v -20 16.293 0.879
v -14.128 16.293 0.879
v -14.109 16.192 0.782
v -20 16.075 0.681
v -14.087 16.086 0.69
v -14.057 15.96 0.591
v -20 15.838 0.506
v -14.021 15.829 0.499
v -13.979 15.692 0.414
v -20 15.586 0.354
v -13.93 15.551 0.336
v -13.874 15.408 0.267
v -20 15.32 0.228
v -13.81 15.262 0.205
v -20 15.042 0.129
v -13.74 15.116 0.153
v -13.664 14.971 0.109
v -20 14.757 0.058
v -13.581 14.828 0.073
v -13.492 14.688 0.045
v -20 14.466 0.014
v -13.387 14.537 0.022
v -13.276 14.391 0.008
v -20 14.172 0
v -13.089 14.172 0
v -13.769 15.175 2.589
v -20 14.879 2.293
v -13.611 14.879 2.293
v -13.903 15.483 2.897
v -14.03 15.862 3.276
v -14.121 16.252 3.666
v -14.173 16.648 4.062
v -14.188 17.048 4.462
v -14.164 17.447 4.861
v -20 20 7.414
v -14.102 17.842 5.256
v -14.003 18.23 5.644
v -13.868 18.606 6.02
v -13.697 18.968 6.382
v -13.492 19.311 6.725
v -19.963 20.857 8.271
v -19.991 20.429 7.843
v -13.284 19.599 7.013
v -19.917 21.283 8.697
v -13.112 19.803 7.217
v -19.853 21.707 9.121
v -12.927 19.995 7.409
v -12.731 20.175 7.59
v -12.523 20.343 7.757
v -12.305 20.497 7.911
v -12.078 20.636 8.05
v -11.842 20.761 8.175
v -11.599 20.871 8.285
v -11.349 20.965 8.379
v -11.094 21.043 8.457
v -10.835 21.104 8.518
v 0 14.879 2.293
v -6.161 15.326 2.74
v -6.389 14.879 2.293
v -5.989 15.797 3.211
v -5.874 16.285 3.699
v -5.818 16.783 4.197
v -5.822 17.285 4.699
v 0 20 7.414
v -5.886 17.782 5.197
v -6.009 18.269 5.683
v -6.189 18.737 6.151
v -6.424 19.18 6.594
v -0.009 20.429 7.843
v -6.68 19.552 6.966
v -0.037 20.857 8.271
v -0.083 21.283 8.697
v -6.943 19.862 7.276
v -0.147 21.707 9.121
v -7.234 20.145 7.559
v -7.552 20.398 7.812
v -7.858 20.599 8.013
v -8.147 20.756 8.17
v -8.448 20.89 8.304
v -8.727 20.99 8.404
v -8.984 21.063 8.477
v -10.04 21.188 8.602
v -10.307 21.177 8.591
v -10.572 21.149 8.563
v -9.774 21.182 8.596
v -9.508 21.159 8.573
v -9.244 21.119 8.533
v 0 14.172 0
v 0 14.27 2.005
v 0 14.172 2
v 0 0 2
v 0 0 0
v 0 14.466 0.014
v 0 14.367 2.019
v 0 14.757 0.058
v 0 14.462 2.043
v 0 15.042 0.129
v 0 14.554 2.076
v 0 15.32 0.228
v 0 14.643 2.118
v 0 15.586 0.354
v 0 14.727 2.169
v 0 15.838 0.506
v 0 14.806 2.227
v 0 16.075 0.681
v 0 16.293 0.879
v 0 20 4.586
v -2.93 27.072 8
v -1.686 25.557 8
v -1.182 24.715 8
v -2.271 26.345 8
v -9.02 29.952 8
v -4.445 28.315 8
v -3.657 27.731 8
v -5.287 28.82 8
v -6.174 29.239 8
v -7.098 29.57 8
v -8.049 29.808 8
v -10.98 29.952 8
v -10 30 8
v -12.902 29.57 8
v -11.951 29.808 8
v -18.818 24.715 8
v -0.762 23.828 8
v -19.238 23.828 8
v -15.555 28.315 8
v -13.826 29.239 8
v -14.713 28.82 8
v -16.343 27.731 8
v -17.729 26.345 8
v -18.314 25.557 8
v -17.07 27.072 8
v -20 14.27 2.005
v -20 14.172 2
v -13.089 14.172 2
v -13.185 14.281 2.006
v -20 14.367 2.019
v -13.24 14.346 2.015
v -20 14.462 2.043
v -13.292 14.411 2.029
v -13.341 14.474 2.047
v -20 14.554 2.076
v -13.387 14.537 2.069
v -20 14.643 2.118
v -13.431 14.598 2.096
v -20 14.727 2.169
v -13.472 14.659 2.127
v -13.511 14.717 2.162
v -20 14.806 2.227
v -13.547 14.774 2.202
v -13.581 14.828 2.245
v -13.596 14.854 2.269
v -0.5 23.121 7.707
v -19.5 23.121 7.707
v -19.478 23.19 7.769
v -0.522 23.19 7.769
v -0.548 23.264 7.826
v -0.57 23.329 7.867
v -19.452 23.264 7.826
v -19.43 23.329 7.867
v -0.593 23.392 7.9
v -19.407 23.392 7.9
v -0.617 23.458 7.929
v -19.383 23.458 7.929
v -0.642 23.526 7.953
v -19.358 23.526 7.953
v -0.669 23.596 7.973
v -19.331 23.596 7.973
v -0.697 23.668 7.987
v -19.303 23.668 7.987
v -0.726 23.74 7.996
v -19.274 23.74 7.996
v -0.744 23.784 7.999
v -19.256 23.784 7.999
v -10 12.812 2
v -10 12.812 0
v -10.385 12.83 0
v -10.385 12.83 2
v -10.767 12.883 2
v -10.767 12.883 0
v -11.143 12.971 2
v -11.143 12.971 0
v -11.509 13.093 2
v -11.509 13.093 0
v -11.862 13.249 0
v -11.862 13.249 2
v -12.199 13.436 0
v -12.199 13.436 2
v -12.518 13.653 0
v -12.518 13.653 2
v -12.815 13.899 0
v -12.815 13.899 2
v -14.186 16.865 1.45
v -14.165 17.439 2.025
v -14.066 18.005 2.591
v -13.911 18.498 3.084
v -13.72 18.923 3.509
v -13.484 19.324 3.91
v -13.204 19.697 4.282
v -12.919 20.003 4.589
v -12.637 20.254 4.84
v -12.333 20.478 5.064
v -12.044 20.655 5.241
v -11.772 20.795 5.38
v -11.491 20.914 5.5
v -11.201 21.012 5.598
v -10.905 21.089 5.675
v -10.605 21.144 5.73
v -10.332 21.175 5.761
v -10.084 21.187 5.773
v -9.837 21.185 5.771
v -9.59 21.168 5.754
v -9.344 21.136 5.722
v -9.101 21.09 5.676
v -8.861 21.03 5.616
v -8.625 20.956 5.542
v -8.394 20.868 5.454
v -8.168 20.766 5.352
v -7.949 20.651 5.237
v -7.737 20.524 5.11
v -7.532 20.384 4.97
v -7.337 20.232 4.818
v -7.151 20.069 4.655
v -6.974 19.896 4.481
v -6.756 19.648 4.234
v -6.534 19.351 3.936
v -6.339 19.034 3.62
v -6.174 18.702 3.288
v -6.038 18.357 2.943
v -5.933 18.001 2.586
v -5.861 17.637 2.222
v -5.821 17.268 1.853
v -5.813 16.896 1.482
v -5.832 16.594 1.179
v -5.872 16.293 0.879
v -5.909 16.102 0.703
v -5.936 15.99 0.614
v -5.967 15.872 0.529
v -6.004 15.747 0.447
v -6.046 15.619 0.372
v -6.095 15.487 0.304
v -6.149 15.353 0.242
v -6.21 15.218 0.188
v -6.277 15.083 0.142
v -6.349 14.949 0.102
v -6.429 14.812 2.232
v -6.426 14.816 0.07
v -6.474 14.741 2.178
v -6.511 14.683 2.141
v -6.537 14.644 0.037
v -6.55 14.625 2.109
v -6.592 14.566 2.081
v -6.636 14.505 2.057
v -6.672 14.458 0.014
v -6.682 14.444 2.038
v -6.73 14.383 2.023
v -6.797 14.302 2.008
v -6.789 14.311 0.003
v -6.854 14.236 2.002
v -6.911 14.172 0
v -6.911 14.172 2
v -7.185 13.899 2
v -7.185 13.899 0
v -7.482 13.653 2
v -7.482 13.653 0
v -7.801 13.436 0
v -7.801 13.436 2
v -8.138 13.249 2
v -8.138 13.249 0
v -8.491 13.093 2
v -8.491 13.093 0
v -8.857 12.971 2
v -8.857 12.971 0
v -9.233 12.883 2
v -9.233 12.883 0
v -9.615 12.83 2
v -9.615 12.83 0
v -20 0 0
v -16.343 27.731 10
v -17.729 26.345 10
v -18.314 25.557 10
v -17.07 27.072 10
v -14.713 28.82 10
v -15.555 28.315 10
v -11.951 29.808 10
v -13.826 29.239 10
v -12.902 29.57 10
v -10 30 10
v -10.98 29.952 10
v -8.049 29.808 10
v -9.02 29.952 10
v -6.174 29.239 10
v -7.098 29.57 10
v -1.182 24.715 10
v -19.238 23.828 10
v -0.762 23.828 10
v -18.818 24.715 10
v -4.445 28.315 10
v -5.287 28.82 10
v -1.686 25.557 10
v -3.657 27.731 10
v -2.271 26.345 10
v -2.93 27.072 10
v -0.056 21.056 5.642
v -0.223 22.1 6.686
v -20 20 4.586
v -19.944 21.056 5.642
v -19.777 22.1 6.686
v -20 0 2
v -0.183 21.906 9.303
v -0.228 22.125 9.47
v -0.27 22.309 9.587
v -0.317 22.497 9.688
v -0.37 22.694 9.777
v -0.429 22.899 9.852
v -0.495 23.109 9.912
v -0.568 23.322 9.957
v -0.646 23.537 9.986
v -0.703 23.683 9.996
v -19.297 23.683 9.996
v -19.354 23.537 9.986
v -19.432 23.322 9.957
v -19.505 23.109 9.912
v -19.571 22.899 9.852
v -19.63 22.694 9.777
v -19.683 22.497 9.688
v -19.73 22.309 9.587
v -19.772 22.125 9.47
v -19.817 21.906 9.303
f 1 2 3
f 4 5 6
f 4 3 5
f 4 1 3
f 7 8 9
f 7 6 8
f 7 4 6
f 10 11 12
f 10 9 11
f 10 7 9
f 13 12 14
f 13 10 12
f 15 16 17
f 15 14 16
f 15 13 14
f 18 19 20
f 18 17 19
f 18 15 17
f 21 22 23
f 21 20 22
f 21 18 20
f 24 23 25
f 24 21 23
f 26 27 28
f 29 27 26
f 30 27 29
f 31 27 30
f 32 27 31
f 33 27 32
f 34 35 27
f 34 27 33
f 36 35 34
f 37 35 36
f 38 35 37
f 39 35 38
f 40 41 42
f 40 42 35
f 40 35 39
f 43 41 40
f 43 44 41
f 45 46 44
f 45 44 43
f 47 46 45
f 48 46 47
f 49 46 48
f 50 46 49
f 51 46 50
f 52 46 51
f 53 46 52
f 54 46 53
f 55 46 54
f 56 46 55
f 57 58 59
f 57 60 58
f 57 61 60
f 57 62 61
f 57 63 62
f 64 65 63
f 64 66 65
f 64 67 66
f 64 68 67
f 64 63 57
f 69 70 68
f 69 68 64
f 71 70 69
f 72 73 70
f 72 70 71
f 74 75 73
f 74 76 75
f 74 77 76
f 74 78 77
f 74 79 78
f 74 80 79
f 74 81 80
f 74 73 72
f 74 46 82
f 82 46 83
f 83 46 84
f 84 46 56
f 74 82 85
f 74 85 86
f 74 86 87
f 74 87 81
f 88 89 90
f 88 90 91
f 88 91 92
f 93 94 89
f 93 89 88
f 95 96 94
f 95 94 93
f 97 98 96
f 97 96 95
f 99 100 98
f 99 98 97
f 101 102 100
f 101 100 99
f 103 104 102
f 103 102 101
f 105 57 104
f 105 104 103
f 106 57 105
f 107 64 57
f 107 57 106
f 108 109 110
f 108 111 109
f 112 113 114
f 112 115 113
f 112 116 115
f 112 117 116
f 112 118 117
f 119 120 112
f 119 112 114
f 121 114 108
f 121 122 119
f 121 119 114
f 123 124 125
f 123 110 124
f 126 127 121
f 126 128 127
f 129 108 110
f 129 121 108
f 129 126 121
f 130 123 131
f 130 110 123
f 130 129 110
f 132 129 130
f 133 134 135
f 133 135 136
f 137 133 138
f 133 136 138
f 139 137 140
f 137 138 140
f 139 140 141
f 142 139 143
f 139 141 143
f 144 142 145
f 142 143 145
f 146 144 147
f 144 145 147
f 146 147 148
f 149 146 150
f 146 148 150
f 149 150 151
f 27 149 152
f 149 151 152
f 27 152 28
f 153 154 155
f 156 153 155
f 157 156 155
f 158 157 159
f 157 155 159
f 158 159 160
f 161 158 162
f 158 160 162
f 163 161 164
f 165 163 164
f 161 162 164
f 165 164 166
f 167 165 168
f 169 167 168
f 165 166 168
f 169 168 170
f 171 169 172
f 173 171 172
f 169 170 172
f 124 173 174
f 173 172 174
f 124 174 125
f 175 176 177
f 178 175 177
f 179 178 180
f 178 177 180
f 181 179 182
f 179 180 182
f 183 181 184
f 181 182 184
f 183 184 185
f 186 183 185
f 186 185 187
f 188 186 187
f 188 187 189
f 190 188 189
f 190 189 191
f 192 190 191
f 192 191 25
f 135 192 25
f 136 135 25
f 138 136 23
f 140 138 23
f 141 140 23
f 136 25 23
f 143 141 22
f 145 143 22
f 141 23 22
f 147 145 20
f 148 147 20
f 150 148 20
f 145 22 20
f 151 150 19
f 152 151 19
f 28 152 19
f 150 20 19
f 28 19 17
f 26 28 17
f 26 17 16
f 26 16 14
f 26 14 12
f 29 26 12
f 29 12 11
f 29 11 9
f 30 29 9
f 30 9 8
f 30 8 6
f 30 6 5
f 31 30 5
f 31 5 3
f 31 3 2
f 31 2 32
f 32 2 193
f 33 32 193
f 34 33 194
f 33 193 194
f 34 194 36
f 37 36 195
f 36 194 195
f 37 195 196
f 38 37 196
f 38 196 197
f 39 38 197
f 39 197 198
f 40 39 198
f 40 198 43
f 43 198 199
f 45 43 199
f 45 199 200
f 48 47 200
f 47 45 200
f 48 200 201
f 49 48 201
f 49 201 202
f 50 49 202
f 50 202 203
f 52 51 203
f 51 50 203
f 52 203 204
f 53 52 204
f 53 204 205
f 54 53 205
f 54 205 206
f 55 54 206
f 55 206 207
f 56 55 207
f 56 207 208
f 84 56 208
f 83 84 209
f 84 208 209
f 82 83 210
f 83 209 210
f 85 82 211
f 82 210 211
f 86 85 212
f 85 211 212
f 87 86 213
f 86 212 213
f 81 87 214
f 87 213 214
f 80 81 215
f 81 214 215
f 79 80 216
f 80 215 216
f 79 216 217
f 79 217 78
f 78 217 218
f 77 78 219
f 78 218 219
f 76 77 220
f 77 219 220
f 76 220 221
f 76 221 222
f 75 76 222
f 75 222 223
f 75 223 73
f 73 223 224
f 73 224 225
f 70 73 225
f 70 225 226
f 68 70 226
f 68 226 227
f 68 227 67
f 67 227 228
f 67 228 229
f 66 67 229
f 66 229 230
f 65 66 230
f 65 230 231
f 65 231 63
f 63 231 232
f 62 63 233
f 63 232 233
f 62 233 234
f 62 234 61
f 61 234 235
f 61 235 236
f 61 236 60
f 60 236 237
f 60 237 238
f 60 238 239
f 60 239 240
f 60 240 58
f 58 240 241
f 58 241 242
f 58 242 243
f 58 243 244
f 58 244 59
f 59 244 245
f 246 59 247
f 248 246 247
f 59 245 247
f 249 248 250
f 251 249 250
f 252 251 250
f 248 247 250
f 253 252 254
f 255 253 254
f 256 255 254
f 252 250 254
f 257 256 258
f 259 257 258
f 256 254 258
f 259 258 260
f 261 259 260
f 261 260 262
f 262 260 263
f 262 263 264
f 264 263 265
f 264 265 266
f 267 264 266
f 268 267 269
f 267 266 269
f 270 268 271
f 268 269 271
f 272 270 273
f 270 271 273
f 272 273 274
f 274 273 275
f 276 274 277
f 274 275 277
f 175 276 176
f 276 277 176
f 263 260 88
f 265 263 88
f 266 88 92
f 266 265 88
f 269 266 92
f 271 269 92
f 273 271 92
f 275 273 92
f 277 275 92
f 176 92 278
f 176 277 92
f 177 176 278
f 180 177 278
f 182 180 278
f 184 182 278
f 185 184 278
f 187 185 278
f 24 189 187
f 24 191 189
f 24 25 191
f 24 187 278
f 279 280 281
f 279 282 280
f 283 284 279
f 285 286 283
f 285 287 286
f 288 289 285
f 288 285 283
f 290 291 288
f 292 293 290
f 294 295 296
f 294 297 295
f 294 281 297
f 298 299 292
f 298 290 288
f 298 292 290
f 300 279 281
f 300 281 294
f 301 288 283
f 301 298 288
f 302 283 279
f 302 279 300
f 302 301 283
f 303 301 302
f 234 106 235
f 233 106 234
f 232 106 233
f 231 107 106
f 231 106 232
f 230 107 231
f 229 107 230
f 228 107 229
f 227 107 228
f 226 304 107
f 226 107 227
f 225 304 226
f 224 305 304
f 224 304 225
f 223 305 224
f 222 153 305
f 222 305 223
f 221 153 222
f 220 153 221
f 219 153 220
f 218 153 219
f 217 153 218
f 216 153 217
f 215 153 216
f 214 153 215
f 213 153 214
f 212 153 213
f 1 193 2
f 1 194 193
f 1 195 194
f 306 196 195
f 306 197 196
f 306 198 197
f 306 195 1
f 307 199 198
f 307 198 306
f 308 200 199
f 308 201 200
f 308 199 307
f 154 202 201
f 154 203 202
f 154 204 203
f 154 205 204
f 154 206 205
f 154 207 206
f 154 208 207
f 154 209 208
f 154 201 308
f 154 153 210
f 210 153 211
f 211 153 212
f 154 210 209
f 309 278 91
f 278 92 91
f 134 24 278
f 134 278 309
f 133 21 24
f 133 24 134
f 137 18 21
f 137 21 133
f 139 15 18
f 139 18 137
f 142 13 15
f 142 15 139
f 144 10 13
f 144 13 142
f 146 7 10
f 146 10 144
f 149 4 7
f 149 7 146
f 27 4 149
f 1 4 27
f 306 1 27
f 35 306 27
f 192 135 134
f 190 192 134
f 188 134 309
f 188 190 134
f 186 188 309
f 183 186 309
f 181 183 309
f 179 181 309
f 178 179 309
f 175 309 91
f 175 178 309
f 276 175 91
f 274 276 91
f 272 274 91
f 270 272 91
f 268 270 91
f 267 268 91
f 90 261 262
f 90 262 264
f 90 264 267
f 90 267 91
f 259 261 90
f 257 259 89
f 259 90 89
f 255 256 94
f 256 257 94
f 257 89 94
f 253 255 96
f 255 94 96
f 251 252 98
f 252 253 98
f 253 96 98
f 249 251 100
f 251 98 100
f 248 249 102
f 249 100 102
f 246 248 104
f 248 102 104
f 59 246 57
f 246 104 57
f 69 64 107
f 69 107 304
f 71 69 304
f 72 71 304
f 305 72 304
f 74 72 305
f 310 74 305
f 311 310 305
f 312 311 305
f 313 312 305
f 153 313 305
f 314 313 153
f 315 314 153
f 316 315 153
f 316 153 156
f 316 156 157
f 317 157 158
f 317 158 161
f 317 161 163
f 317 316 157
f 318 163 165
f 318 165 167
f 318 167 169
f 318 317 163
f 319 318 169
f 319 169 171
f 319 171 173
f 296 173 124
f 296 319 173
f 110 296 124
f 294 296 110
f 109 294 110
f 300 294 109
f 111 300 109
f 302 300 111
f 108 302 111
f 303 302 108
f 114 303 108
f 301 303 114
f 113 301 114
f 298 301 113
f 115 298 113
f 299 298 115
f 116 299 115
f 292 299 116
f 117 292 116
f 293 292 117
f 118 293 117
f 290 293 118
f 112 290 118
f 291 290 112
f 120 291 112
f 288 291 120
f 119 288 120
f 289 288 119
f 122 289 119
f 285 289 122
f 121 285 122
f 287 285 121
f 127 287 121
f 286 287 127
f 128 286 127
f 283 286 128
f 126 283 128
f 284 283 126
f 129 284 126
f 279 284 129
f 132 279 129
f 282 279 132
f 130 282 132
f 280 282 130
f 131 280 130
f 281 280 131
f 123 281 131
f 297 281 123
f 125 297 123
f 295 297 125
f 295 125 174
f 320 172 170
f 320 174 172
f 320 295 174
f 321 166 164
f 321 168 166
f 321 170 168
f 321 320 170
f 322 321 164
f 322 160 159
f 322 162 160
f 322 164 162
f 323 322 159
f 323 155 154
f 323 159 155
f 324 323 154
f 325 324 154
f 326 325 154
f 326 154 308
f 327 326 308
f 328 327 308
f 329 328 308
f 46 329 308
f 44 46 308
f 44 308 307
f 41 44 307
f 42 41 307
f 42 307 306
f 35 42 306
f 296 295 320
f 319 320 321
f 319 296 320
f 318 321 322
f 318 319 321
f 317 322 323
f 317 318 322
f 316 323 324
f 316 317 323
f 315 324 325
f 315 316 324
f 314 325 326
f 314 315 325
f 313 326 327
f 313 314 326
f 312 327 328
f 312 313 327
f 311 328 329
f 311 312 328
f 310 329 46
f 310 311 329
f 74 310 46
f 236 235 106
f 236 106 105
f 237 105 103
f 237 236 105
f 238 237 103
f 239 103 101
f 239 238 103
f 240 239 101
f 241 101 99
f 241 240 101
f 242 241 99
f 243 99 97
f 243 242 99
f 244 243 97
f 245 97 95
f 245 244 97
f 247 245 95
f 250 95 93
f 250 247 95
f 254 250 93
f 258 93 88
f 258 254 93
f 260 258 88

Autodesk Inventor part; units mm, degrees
ref_plane "YZ Plane" through (0, 0, 0) normal (1, 0, 0) x (0, 1, 0)
ref_plane "XZ Plane" through (0, 0, 0) normal (0, 1, 0) x (-1, 0, 0)
ref_plane "XY Plane" through (0, 0, 0) normal (0, 0, 1) x (1, 0, 0)
sketch "Szkic1" plane through (0, 0, 0) normal (0, 1, 0) x (-1, 0, 0)
  line L0 (0, 0) -> (20, 0)
  line L1 (20, 0) -> (20, 2)
  line L2 (20, 2) -> (0, 2)
  line L3 (0, 2) -> (0, 0)
  dimension "d20" = 20
  dimension "d21" = 2
sketch "Szkic5" plane through (0, 0, 0) normal (1, 0, 0) x (0, 1, 0)
  line L0 (0, 2) -> (0, 0) construction
  line L1 (0, 1) -> (14.1716, 1)
  line L2 (15.5858, 1.5858) -> (22.4142, 8.4142)
  line L3 (23.8284, 9) -> (30, 9)
  arc A0 (14.1716, 1) -> (15.5858, 1.5858) centre (14.1716, 3) ccw
  arc A1 (23.8284, 9) -> (22.4142, 8.4142) centre (23.8284, 7) ccw
  point P0 (15, 1)
  point P1 (23, 9)
  dimension "d22" = 15
  dimension "d23" = 8
  dimension "d24" = 30
  dimension "d25" = 45
  dimension "d27" = 2
sweep "Przeciągnięcie1" add profiles "Szkic1" path "Szkic5"
fillet "Zaokrąglenie1" radius 10 2 edges at (-20, 30, 9) (0, 30, 9)
sketch "Szkic2" plane through (-20, 23.8284, 10) normal (0, 0, 1) x (1, 0, 0)
  arc A0 (19.2381, 0) -> (0.7619, 0) centre (10, -3.8284) ccw projected
  point P0 (20, 26.1716)
  point P1 (0, 26.1716)
  point P2 (10, -6.8284)
  dimension "d29" = 3
hole "Otwór1" at (-10, 17, 10) direction (0, 0, -1) diameter 8.376 end through all
pattern_linear "Szyk prostokątny2" [suppressed]
equation "\"d12\" = Grubość"
equation "\"PromieńGięcia\" = Grubość"
equation "\"SzerokośćGięciaPodcięcia\" = Grubość"
equation "\"GłębokośćGięciaPodcięcia\" = 0.5 * Grubość"
equation "\"RozmiarPodcięciaNarożnika\" = 4 * Grubość"
equation "\"MinimalnaPozostałość\" = 2 * Grubość"
equation "\"PromieńPrzejścia\" = PromieńGięcia"
equation "\"Rozmiar_promienia_Jacobiego\" = Grubość"
equation "\"Wielk_odstępu\" = Grubość"
equation "\"d5\" = PromieńGięcia"
equation "\"Grubość\" = 2"
properties part number "Blaszka_do_ciągu" material "Aluminium 6061-AHC"
